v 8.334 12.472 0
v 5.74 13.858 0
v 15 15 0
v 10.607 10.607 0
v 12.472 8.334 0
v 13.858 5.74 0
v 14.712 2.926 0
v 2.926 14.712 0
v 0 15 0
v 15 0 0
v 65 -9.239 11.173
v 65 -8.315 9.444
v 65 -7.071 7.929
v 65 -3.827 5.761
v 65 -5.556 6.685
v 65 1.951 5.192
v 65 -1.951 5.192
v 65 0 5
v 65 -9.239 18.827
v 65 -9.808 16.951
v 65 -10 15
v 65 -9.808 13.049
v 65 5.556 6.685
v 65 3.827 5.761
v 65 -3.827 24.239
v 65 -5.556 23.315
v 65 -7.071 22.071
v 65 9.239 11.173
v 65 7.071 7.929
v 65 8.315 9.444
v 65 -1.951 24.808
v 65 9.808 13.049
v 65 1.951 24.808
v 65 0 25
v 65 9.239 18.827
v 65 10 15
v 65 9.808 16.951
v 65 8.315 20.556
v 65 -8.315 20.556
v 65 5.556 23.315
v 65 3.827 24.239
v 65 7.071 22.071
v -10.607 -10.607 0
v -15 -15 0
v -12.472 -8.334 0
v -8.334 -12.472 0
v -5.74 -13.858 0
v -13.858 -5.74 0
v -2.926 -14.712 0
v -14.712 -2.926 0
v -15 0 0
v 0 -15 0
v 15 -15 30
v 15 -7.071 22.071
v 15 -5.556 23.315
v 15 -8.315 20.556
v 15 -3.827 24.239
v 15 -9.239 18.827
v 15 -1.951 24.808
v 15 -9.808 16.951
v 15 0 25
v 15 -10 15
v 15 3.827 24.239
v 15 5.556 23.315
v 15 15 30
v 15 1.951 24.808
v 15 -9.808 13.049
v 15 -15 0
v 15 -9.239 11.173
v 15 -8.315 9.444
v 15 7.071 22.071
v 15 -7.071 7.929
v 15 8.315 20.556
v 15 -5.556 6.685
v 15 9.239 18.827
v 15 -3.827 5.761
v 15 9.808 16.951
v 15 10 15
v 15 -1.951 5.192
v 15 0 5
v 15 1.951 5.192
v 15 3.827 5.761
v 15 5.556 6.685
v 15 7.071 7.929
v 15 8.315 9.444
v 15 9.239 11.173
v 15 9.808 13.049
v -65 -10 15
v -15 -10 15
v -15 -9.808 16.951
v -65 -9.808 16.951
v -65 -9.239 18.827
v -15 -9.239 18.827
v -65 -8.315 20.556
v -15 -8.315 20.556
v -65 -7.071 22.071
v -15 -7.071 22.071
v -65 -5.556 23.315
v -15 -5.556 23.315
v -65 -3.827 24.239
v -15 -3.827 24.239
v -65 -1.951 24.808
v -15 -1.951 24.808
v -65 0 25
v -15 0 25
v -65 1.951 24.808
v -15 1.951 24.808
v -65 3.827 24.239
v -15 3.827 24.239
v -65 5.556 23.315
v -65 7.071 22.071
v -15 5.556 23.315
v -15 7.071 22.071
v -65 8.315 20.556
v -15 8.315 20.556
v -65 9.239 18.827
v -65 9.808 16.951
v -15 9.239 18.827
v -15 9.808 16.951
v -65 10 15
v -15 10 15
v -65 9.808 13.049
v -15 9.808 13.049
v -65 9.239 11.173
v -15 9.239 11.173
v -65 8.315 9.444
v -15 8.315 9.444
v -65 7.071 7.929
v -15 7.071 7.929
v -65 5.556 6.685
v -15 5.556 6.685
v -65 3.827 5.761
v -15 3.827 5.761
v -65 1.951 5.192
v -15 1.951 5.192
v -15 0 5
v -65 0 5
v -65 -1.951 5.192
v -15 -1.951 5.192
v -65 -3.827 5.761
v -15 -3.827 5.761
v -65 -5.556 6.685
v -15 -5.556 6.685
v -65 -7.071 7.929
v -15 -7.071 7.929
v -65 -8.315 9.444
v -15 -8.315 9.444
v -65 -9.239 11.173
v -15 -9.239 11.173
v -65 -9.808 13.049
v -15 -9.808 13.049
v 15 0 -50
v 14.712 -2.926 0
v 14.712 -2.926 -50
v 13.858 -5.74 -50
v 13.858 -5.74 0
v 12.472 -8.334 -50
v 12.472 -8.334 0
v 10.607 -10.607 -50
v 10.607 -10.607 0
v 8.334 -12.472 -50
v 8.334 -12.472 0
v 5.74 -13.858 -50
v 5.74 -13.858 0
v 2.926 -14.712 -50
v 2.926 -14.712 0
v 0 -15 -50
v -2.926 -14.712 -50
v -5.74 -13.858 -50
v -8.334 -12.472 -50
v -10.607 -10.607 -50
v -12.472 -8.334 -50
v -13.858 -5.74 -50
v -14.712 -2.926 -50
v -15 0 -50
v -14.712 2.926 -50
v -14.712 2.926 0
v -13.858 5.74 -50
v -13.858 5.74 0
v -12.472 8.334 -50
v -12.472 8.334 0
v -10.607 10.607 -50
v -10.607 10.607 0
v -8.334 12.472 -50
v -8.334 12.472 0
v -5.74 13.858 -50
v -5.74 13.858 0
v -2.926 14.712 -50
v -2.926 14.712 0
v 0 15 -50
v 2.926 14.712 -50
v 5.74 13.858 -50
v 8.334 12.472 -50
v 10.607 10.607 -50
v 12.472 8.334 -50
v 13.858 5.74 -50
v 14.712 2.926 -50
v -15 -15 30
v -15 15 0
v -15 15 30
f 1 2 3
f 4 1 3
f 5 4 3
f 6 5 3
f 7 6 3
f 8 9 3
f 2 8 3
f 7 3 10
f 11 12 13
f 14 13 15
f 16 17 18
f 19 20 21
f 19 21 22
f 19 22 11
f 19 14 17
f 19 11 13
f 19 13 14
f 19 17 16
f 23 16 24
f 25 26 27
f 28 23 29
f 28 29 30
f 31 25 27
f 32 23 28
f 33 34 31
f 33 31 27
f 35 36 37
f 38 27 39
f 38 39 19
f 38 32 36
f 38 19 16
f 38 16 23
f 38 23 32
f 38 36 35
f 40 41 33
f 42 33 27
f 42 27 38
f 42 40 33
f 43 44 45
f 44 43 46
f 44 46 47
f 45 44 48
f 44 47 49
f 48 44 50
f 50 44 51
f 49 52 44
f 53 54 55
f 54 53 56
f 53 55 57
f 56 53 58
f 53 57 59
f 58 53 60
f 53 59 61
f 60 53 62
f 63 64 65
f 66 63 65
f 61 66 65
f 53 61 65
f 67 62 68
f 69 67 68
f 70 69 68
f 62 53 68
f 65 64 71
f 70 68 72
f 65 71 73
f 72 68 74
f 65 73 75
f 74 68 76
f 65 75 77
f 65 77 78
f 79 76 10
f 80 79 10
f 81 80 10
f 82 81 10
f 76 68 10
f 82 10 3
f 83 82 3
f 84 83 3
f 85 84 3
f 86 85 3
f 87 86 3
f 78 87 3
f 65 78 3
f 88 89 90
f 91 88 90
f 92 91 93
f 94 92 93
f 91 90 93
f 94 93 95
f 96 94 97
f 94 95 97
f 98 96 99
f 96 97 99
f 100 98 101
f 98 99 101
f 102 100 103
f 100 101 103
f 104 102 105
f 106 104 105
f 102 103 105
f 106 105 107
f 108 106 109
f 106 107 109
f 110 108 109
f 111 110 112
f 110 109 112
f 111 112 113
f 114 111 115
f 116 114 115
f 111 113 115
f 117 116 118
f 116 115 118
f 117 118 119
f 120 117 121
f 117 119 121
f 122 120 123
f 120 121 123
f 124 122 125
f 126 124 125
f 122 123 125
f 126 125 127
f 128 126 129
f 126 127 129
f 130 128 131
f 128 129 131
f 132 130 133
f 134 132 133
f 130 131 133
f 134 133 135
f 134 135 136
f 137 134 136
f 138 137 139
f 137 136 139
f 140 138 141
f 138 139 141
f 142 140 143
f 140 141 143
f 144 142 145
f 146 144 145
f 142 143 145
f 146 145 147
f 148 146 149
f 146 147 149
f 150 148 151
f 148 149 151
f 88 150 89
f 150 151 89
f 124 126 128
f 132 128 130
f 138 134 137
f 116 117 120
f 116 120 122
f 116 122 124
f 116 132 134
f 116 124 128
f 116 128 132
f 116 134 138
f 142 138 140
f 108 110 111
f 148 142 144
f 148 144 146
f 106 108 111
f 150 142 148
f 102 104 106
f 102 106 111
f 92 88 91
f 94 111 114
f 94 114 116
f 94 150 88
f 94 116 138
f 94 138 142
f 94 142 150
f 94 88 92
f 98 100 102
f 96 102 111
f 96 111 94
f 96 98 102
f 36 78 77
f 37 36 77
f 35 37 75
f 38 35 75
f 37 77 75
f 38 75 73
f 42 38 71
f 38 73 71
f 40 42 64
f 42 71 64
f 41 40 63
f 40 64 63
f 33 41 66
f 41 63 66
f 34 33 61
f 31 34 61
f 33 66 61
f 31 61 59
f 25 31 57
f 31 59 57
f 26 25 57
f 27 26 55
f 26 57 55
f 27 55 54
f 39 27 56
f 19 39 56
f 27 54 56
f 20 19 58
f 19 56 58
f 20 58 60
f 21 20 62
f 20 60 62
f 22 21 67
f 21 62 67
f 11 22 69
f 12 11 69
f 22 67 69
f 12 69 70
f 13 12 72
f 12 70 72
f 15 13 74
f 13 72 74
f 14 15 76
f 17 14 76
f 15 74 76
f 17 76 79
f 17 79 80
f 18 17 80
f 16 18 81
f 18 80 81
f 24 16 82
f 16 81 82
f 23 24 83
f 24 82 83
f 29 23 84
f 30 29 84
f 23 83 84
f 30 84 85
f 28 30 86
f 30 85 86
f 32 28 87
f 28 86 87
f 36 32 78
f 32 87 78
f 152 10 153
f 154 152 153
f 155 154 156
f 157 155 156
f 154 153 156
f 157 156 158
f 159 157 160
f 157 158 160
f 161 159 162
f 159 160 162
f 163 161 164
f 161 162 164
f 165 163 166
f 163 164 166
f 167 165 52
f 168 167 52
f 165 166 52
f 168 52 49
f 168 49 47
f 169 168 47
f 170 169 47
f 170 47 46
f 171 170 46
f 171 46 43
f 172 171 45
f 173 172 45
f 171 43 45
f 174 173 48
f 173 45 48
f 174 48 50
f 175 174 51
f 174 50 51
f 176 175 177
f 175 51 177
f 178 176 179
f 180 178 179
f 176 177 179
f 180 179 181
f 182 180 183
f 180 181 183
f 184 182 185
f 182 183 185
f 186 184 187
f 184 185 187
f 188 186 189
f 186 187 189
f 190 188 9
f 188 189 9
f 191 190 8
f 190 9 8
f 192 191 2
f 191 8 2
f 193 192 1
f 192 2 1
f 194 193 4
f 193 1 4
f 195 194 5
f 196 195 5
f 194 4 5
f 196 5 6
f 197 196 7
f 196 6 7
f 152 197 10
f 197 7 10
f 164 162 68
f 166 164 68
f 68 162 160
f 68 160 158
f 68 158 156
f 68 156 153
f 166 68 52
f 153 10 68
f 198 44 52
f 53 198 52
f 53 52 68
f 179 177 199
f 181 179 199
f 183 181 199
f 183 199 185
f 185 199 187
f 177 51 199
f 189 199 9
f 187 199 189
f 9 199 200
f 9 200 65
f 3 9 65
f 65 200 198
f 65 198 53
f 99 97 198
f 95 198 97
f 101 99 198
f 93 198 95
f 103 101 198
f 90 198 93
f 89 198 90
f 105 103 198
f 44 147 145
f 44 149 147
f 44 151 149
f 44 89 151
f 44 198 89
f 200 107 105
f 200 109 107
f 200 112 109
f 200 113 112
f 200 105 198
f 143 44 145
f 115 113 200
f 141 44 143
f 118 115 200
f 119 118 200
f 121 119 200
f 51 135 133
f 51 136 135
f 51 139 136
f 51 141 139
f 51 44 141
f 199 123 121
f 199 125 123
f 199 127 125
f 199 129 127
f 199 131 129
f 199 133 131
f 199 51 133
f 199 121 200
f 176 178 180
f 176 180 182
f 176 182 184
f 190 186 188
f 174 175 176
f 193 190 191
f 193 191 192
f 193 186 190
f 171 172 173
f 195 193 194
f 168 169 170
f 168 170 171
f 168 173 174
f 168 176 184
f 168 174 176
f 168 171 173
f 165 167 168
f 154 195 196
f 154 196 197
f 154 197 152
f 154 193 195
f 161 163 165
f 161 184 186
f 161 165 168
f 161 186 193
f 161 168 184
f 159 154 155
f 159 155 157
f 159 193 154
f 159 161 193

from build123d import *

# Parameters (mm, degrees)
F0_W     = 30
F0_H     = 30
F1_DEPTH = 30
F2_R     = 15
F3_DEPTH = 50
F4_R     = 10
F5_DEPTH = 50
F6_R     = 10
F7_DEPTH = 50


with BuildPart() as f1:
    # F0 (on Top) → F1 (new body)
    with BuildSketch(Plane.XY):
        Rectangle(F0_W, F0_H)
    extrude(amount=F1_DEPTH)

    # F2 (on face) → F3 (join)
    with BuildSketch(Plane(origin=(0, 0, 0), x_dir=(1, 0, 0), z_dir=(0, 0, -1))):
        Circle(F2_R)
    extrude(amount=F3_DEPTH)

    # F4 (on face) → F5 (join)
    with BuildSketch(Plane.YZ.offset(15)):
        with Locations((0, 15)):
            Circle(F4_R)
    extrude(amount=F5_DEPTH)

    # F6 (on face) → F7 (join)
    with BuildSketch(Plane(origin=(-15, 0, 0), x_dir=(0, -1, 0), z_dir=(-1, 0, 0))):
        with Locations((0, 15)):
            Circle(F6_R)
    extrude(amount=F7_DEPTH)


solid = f1.part
